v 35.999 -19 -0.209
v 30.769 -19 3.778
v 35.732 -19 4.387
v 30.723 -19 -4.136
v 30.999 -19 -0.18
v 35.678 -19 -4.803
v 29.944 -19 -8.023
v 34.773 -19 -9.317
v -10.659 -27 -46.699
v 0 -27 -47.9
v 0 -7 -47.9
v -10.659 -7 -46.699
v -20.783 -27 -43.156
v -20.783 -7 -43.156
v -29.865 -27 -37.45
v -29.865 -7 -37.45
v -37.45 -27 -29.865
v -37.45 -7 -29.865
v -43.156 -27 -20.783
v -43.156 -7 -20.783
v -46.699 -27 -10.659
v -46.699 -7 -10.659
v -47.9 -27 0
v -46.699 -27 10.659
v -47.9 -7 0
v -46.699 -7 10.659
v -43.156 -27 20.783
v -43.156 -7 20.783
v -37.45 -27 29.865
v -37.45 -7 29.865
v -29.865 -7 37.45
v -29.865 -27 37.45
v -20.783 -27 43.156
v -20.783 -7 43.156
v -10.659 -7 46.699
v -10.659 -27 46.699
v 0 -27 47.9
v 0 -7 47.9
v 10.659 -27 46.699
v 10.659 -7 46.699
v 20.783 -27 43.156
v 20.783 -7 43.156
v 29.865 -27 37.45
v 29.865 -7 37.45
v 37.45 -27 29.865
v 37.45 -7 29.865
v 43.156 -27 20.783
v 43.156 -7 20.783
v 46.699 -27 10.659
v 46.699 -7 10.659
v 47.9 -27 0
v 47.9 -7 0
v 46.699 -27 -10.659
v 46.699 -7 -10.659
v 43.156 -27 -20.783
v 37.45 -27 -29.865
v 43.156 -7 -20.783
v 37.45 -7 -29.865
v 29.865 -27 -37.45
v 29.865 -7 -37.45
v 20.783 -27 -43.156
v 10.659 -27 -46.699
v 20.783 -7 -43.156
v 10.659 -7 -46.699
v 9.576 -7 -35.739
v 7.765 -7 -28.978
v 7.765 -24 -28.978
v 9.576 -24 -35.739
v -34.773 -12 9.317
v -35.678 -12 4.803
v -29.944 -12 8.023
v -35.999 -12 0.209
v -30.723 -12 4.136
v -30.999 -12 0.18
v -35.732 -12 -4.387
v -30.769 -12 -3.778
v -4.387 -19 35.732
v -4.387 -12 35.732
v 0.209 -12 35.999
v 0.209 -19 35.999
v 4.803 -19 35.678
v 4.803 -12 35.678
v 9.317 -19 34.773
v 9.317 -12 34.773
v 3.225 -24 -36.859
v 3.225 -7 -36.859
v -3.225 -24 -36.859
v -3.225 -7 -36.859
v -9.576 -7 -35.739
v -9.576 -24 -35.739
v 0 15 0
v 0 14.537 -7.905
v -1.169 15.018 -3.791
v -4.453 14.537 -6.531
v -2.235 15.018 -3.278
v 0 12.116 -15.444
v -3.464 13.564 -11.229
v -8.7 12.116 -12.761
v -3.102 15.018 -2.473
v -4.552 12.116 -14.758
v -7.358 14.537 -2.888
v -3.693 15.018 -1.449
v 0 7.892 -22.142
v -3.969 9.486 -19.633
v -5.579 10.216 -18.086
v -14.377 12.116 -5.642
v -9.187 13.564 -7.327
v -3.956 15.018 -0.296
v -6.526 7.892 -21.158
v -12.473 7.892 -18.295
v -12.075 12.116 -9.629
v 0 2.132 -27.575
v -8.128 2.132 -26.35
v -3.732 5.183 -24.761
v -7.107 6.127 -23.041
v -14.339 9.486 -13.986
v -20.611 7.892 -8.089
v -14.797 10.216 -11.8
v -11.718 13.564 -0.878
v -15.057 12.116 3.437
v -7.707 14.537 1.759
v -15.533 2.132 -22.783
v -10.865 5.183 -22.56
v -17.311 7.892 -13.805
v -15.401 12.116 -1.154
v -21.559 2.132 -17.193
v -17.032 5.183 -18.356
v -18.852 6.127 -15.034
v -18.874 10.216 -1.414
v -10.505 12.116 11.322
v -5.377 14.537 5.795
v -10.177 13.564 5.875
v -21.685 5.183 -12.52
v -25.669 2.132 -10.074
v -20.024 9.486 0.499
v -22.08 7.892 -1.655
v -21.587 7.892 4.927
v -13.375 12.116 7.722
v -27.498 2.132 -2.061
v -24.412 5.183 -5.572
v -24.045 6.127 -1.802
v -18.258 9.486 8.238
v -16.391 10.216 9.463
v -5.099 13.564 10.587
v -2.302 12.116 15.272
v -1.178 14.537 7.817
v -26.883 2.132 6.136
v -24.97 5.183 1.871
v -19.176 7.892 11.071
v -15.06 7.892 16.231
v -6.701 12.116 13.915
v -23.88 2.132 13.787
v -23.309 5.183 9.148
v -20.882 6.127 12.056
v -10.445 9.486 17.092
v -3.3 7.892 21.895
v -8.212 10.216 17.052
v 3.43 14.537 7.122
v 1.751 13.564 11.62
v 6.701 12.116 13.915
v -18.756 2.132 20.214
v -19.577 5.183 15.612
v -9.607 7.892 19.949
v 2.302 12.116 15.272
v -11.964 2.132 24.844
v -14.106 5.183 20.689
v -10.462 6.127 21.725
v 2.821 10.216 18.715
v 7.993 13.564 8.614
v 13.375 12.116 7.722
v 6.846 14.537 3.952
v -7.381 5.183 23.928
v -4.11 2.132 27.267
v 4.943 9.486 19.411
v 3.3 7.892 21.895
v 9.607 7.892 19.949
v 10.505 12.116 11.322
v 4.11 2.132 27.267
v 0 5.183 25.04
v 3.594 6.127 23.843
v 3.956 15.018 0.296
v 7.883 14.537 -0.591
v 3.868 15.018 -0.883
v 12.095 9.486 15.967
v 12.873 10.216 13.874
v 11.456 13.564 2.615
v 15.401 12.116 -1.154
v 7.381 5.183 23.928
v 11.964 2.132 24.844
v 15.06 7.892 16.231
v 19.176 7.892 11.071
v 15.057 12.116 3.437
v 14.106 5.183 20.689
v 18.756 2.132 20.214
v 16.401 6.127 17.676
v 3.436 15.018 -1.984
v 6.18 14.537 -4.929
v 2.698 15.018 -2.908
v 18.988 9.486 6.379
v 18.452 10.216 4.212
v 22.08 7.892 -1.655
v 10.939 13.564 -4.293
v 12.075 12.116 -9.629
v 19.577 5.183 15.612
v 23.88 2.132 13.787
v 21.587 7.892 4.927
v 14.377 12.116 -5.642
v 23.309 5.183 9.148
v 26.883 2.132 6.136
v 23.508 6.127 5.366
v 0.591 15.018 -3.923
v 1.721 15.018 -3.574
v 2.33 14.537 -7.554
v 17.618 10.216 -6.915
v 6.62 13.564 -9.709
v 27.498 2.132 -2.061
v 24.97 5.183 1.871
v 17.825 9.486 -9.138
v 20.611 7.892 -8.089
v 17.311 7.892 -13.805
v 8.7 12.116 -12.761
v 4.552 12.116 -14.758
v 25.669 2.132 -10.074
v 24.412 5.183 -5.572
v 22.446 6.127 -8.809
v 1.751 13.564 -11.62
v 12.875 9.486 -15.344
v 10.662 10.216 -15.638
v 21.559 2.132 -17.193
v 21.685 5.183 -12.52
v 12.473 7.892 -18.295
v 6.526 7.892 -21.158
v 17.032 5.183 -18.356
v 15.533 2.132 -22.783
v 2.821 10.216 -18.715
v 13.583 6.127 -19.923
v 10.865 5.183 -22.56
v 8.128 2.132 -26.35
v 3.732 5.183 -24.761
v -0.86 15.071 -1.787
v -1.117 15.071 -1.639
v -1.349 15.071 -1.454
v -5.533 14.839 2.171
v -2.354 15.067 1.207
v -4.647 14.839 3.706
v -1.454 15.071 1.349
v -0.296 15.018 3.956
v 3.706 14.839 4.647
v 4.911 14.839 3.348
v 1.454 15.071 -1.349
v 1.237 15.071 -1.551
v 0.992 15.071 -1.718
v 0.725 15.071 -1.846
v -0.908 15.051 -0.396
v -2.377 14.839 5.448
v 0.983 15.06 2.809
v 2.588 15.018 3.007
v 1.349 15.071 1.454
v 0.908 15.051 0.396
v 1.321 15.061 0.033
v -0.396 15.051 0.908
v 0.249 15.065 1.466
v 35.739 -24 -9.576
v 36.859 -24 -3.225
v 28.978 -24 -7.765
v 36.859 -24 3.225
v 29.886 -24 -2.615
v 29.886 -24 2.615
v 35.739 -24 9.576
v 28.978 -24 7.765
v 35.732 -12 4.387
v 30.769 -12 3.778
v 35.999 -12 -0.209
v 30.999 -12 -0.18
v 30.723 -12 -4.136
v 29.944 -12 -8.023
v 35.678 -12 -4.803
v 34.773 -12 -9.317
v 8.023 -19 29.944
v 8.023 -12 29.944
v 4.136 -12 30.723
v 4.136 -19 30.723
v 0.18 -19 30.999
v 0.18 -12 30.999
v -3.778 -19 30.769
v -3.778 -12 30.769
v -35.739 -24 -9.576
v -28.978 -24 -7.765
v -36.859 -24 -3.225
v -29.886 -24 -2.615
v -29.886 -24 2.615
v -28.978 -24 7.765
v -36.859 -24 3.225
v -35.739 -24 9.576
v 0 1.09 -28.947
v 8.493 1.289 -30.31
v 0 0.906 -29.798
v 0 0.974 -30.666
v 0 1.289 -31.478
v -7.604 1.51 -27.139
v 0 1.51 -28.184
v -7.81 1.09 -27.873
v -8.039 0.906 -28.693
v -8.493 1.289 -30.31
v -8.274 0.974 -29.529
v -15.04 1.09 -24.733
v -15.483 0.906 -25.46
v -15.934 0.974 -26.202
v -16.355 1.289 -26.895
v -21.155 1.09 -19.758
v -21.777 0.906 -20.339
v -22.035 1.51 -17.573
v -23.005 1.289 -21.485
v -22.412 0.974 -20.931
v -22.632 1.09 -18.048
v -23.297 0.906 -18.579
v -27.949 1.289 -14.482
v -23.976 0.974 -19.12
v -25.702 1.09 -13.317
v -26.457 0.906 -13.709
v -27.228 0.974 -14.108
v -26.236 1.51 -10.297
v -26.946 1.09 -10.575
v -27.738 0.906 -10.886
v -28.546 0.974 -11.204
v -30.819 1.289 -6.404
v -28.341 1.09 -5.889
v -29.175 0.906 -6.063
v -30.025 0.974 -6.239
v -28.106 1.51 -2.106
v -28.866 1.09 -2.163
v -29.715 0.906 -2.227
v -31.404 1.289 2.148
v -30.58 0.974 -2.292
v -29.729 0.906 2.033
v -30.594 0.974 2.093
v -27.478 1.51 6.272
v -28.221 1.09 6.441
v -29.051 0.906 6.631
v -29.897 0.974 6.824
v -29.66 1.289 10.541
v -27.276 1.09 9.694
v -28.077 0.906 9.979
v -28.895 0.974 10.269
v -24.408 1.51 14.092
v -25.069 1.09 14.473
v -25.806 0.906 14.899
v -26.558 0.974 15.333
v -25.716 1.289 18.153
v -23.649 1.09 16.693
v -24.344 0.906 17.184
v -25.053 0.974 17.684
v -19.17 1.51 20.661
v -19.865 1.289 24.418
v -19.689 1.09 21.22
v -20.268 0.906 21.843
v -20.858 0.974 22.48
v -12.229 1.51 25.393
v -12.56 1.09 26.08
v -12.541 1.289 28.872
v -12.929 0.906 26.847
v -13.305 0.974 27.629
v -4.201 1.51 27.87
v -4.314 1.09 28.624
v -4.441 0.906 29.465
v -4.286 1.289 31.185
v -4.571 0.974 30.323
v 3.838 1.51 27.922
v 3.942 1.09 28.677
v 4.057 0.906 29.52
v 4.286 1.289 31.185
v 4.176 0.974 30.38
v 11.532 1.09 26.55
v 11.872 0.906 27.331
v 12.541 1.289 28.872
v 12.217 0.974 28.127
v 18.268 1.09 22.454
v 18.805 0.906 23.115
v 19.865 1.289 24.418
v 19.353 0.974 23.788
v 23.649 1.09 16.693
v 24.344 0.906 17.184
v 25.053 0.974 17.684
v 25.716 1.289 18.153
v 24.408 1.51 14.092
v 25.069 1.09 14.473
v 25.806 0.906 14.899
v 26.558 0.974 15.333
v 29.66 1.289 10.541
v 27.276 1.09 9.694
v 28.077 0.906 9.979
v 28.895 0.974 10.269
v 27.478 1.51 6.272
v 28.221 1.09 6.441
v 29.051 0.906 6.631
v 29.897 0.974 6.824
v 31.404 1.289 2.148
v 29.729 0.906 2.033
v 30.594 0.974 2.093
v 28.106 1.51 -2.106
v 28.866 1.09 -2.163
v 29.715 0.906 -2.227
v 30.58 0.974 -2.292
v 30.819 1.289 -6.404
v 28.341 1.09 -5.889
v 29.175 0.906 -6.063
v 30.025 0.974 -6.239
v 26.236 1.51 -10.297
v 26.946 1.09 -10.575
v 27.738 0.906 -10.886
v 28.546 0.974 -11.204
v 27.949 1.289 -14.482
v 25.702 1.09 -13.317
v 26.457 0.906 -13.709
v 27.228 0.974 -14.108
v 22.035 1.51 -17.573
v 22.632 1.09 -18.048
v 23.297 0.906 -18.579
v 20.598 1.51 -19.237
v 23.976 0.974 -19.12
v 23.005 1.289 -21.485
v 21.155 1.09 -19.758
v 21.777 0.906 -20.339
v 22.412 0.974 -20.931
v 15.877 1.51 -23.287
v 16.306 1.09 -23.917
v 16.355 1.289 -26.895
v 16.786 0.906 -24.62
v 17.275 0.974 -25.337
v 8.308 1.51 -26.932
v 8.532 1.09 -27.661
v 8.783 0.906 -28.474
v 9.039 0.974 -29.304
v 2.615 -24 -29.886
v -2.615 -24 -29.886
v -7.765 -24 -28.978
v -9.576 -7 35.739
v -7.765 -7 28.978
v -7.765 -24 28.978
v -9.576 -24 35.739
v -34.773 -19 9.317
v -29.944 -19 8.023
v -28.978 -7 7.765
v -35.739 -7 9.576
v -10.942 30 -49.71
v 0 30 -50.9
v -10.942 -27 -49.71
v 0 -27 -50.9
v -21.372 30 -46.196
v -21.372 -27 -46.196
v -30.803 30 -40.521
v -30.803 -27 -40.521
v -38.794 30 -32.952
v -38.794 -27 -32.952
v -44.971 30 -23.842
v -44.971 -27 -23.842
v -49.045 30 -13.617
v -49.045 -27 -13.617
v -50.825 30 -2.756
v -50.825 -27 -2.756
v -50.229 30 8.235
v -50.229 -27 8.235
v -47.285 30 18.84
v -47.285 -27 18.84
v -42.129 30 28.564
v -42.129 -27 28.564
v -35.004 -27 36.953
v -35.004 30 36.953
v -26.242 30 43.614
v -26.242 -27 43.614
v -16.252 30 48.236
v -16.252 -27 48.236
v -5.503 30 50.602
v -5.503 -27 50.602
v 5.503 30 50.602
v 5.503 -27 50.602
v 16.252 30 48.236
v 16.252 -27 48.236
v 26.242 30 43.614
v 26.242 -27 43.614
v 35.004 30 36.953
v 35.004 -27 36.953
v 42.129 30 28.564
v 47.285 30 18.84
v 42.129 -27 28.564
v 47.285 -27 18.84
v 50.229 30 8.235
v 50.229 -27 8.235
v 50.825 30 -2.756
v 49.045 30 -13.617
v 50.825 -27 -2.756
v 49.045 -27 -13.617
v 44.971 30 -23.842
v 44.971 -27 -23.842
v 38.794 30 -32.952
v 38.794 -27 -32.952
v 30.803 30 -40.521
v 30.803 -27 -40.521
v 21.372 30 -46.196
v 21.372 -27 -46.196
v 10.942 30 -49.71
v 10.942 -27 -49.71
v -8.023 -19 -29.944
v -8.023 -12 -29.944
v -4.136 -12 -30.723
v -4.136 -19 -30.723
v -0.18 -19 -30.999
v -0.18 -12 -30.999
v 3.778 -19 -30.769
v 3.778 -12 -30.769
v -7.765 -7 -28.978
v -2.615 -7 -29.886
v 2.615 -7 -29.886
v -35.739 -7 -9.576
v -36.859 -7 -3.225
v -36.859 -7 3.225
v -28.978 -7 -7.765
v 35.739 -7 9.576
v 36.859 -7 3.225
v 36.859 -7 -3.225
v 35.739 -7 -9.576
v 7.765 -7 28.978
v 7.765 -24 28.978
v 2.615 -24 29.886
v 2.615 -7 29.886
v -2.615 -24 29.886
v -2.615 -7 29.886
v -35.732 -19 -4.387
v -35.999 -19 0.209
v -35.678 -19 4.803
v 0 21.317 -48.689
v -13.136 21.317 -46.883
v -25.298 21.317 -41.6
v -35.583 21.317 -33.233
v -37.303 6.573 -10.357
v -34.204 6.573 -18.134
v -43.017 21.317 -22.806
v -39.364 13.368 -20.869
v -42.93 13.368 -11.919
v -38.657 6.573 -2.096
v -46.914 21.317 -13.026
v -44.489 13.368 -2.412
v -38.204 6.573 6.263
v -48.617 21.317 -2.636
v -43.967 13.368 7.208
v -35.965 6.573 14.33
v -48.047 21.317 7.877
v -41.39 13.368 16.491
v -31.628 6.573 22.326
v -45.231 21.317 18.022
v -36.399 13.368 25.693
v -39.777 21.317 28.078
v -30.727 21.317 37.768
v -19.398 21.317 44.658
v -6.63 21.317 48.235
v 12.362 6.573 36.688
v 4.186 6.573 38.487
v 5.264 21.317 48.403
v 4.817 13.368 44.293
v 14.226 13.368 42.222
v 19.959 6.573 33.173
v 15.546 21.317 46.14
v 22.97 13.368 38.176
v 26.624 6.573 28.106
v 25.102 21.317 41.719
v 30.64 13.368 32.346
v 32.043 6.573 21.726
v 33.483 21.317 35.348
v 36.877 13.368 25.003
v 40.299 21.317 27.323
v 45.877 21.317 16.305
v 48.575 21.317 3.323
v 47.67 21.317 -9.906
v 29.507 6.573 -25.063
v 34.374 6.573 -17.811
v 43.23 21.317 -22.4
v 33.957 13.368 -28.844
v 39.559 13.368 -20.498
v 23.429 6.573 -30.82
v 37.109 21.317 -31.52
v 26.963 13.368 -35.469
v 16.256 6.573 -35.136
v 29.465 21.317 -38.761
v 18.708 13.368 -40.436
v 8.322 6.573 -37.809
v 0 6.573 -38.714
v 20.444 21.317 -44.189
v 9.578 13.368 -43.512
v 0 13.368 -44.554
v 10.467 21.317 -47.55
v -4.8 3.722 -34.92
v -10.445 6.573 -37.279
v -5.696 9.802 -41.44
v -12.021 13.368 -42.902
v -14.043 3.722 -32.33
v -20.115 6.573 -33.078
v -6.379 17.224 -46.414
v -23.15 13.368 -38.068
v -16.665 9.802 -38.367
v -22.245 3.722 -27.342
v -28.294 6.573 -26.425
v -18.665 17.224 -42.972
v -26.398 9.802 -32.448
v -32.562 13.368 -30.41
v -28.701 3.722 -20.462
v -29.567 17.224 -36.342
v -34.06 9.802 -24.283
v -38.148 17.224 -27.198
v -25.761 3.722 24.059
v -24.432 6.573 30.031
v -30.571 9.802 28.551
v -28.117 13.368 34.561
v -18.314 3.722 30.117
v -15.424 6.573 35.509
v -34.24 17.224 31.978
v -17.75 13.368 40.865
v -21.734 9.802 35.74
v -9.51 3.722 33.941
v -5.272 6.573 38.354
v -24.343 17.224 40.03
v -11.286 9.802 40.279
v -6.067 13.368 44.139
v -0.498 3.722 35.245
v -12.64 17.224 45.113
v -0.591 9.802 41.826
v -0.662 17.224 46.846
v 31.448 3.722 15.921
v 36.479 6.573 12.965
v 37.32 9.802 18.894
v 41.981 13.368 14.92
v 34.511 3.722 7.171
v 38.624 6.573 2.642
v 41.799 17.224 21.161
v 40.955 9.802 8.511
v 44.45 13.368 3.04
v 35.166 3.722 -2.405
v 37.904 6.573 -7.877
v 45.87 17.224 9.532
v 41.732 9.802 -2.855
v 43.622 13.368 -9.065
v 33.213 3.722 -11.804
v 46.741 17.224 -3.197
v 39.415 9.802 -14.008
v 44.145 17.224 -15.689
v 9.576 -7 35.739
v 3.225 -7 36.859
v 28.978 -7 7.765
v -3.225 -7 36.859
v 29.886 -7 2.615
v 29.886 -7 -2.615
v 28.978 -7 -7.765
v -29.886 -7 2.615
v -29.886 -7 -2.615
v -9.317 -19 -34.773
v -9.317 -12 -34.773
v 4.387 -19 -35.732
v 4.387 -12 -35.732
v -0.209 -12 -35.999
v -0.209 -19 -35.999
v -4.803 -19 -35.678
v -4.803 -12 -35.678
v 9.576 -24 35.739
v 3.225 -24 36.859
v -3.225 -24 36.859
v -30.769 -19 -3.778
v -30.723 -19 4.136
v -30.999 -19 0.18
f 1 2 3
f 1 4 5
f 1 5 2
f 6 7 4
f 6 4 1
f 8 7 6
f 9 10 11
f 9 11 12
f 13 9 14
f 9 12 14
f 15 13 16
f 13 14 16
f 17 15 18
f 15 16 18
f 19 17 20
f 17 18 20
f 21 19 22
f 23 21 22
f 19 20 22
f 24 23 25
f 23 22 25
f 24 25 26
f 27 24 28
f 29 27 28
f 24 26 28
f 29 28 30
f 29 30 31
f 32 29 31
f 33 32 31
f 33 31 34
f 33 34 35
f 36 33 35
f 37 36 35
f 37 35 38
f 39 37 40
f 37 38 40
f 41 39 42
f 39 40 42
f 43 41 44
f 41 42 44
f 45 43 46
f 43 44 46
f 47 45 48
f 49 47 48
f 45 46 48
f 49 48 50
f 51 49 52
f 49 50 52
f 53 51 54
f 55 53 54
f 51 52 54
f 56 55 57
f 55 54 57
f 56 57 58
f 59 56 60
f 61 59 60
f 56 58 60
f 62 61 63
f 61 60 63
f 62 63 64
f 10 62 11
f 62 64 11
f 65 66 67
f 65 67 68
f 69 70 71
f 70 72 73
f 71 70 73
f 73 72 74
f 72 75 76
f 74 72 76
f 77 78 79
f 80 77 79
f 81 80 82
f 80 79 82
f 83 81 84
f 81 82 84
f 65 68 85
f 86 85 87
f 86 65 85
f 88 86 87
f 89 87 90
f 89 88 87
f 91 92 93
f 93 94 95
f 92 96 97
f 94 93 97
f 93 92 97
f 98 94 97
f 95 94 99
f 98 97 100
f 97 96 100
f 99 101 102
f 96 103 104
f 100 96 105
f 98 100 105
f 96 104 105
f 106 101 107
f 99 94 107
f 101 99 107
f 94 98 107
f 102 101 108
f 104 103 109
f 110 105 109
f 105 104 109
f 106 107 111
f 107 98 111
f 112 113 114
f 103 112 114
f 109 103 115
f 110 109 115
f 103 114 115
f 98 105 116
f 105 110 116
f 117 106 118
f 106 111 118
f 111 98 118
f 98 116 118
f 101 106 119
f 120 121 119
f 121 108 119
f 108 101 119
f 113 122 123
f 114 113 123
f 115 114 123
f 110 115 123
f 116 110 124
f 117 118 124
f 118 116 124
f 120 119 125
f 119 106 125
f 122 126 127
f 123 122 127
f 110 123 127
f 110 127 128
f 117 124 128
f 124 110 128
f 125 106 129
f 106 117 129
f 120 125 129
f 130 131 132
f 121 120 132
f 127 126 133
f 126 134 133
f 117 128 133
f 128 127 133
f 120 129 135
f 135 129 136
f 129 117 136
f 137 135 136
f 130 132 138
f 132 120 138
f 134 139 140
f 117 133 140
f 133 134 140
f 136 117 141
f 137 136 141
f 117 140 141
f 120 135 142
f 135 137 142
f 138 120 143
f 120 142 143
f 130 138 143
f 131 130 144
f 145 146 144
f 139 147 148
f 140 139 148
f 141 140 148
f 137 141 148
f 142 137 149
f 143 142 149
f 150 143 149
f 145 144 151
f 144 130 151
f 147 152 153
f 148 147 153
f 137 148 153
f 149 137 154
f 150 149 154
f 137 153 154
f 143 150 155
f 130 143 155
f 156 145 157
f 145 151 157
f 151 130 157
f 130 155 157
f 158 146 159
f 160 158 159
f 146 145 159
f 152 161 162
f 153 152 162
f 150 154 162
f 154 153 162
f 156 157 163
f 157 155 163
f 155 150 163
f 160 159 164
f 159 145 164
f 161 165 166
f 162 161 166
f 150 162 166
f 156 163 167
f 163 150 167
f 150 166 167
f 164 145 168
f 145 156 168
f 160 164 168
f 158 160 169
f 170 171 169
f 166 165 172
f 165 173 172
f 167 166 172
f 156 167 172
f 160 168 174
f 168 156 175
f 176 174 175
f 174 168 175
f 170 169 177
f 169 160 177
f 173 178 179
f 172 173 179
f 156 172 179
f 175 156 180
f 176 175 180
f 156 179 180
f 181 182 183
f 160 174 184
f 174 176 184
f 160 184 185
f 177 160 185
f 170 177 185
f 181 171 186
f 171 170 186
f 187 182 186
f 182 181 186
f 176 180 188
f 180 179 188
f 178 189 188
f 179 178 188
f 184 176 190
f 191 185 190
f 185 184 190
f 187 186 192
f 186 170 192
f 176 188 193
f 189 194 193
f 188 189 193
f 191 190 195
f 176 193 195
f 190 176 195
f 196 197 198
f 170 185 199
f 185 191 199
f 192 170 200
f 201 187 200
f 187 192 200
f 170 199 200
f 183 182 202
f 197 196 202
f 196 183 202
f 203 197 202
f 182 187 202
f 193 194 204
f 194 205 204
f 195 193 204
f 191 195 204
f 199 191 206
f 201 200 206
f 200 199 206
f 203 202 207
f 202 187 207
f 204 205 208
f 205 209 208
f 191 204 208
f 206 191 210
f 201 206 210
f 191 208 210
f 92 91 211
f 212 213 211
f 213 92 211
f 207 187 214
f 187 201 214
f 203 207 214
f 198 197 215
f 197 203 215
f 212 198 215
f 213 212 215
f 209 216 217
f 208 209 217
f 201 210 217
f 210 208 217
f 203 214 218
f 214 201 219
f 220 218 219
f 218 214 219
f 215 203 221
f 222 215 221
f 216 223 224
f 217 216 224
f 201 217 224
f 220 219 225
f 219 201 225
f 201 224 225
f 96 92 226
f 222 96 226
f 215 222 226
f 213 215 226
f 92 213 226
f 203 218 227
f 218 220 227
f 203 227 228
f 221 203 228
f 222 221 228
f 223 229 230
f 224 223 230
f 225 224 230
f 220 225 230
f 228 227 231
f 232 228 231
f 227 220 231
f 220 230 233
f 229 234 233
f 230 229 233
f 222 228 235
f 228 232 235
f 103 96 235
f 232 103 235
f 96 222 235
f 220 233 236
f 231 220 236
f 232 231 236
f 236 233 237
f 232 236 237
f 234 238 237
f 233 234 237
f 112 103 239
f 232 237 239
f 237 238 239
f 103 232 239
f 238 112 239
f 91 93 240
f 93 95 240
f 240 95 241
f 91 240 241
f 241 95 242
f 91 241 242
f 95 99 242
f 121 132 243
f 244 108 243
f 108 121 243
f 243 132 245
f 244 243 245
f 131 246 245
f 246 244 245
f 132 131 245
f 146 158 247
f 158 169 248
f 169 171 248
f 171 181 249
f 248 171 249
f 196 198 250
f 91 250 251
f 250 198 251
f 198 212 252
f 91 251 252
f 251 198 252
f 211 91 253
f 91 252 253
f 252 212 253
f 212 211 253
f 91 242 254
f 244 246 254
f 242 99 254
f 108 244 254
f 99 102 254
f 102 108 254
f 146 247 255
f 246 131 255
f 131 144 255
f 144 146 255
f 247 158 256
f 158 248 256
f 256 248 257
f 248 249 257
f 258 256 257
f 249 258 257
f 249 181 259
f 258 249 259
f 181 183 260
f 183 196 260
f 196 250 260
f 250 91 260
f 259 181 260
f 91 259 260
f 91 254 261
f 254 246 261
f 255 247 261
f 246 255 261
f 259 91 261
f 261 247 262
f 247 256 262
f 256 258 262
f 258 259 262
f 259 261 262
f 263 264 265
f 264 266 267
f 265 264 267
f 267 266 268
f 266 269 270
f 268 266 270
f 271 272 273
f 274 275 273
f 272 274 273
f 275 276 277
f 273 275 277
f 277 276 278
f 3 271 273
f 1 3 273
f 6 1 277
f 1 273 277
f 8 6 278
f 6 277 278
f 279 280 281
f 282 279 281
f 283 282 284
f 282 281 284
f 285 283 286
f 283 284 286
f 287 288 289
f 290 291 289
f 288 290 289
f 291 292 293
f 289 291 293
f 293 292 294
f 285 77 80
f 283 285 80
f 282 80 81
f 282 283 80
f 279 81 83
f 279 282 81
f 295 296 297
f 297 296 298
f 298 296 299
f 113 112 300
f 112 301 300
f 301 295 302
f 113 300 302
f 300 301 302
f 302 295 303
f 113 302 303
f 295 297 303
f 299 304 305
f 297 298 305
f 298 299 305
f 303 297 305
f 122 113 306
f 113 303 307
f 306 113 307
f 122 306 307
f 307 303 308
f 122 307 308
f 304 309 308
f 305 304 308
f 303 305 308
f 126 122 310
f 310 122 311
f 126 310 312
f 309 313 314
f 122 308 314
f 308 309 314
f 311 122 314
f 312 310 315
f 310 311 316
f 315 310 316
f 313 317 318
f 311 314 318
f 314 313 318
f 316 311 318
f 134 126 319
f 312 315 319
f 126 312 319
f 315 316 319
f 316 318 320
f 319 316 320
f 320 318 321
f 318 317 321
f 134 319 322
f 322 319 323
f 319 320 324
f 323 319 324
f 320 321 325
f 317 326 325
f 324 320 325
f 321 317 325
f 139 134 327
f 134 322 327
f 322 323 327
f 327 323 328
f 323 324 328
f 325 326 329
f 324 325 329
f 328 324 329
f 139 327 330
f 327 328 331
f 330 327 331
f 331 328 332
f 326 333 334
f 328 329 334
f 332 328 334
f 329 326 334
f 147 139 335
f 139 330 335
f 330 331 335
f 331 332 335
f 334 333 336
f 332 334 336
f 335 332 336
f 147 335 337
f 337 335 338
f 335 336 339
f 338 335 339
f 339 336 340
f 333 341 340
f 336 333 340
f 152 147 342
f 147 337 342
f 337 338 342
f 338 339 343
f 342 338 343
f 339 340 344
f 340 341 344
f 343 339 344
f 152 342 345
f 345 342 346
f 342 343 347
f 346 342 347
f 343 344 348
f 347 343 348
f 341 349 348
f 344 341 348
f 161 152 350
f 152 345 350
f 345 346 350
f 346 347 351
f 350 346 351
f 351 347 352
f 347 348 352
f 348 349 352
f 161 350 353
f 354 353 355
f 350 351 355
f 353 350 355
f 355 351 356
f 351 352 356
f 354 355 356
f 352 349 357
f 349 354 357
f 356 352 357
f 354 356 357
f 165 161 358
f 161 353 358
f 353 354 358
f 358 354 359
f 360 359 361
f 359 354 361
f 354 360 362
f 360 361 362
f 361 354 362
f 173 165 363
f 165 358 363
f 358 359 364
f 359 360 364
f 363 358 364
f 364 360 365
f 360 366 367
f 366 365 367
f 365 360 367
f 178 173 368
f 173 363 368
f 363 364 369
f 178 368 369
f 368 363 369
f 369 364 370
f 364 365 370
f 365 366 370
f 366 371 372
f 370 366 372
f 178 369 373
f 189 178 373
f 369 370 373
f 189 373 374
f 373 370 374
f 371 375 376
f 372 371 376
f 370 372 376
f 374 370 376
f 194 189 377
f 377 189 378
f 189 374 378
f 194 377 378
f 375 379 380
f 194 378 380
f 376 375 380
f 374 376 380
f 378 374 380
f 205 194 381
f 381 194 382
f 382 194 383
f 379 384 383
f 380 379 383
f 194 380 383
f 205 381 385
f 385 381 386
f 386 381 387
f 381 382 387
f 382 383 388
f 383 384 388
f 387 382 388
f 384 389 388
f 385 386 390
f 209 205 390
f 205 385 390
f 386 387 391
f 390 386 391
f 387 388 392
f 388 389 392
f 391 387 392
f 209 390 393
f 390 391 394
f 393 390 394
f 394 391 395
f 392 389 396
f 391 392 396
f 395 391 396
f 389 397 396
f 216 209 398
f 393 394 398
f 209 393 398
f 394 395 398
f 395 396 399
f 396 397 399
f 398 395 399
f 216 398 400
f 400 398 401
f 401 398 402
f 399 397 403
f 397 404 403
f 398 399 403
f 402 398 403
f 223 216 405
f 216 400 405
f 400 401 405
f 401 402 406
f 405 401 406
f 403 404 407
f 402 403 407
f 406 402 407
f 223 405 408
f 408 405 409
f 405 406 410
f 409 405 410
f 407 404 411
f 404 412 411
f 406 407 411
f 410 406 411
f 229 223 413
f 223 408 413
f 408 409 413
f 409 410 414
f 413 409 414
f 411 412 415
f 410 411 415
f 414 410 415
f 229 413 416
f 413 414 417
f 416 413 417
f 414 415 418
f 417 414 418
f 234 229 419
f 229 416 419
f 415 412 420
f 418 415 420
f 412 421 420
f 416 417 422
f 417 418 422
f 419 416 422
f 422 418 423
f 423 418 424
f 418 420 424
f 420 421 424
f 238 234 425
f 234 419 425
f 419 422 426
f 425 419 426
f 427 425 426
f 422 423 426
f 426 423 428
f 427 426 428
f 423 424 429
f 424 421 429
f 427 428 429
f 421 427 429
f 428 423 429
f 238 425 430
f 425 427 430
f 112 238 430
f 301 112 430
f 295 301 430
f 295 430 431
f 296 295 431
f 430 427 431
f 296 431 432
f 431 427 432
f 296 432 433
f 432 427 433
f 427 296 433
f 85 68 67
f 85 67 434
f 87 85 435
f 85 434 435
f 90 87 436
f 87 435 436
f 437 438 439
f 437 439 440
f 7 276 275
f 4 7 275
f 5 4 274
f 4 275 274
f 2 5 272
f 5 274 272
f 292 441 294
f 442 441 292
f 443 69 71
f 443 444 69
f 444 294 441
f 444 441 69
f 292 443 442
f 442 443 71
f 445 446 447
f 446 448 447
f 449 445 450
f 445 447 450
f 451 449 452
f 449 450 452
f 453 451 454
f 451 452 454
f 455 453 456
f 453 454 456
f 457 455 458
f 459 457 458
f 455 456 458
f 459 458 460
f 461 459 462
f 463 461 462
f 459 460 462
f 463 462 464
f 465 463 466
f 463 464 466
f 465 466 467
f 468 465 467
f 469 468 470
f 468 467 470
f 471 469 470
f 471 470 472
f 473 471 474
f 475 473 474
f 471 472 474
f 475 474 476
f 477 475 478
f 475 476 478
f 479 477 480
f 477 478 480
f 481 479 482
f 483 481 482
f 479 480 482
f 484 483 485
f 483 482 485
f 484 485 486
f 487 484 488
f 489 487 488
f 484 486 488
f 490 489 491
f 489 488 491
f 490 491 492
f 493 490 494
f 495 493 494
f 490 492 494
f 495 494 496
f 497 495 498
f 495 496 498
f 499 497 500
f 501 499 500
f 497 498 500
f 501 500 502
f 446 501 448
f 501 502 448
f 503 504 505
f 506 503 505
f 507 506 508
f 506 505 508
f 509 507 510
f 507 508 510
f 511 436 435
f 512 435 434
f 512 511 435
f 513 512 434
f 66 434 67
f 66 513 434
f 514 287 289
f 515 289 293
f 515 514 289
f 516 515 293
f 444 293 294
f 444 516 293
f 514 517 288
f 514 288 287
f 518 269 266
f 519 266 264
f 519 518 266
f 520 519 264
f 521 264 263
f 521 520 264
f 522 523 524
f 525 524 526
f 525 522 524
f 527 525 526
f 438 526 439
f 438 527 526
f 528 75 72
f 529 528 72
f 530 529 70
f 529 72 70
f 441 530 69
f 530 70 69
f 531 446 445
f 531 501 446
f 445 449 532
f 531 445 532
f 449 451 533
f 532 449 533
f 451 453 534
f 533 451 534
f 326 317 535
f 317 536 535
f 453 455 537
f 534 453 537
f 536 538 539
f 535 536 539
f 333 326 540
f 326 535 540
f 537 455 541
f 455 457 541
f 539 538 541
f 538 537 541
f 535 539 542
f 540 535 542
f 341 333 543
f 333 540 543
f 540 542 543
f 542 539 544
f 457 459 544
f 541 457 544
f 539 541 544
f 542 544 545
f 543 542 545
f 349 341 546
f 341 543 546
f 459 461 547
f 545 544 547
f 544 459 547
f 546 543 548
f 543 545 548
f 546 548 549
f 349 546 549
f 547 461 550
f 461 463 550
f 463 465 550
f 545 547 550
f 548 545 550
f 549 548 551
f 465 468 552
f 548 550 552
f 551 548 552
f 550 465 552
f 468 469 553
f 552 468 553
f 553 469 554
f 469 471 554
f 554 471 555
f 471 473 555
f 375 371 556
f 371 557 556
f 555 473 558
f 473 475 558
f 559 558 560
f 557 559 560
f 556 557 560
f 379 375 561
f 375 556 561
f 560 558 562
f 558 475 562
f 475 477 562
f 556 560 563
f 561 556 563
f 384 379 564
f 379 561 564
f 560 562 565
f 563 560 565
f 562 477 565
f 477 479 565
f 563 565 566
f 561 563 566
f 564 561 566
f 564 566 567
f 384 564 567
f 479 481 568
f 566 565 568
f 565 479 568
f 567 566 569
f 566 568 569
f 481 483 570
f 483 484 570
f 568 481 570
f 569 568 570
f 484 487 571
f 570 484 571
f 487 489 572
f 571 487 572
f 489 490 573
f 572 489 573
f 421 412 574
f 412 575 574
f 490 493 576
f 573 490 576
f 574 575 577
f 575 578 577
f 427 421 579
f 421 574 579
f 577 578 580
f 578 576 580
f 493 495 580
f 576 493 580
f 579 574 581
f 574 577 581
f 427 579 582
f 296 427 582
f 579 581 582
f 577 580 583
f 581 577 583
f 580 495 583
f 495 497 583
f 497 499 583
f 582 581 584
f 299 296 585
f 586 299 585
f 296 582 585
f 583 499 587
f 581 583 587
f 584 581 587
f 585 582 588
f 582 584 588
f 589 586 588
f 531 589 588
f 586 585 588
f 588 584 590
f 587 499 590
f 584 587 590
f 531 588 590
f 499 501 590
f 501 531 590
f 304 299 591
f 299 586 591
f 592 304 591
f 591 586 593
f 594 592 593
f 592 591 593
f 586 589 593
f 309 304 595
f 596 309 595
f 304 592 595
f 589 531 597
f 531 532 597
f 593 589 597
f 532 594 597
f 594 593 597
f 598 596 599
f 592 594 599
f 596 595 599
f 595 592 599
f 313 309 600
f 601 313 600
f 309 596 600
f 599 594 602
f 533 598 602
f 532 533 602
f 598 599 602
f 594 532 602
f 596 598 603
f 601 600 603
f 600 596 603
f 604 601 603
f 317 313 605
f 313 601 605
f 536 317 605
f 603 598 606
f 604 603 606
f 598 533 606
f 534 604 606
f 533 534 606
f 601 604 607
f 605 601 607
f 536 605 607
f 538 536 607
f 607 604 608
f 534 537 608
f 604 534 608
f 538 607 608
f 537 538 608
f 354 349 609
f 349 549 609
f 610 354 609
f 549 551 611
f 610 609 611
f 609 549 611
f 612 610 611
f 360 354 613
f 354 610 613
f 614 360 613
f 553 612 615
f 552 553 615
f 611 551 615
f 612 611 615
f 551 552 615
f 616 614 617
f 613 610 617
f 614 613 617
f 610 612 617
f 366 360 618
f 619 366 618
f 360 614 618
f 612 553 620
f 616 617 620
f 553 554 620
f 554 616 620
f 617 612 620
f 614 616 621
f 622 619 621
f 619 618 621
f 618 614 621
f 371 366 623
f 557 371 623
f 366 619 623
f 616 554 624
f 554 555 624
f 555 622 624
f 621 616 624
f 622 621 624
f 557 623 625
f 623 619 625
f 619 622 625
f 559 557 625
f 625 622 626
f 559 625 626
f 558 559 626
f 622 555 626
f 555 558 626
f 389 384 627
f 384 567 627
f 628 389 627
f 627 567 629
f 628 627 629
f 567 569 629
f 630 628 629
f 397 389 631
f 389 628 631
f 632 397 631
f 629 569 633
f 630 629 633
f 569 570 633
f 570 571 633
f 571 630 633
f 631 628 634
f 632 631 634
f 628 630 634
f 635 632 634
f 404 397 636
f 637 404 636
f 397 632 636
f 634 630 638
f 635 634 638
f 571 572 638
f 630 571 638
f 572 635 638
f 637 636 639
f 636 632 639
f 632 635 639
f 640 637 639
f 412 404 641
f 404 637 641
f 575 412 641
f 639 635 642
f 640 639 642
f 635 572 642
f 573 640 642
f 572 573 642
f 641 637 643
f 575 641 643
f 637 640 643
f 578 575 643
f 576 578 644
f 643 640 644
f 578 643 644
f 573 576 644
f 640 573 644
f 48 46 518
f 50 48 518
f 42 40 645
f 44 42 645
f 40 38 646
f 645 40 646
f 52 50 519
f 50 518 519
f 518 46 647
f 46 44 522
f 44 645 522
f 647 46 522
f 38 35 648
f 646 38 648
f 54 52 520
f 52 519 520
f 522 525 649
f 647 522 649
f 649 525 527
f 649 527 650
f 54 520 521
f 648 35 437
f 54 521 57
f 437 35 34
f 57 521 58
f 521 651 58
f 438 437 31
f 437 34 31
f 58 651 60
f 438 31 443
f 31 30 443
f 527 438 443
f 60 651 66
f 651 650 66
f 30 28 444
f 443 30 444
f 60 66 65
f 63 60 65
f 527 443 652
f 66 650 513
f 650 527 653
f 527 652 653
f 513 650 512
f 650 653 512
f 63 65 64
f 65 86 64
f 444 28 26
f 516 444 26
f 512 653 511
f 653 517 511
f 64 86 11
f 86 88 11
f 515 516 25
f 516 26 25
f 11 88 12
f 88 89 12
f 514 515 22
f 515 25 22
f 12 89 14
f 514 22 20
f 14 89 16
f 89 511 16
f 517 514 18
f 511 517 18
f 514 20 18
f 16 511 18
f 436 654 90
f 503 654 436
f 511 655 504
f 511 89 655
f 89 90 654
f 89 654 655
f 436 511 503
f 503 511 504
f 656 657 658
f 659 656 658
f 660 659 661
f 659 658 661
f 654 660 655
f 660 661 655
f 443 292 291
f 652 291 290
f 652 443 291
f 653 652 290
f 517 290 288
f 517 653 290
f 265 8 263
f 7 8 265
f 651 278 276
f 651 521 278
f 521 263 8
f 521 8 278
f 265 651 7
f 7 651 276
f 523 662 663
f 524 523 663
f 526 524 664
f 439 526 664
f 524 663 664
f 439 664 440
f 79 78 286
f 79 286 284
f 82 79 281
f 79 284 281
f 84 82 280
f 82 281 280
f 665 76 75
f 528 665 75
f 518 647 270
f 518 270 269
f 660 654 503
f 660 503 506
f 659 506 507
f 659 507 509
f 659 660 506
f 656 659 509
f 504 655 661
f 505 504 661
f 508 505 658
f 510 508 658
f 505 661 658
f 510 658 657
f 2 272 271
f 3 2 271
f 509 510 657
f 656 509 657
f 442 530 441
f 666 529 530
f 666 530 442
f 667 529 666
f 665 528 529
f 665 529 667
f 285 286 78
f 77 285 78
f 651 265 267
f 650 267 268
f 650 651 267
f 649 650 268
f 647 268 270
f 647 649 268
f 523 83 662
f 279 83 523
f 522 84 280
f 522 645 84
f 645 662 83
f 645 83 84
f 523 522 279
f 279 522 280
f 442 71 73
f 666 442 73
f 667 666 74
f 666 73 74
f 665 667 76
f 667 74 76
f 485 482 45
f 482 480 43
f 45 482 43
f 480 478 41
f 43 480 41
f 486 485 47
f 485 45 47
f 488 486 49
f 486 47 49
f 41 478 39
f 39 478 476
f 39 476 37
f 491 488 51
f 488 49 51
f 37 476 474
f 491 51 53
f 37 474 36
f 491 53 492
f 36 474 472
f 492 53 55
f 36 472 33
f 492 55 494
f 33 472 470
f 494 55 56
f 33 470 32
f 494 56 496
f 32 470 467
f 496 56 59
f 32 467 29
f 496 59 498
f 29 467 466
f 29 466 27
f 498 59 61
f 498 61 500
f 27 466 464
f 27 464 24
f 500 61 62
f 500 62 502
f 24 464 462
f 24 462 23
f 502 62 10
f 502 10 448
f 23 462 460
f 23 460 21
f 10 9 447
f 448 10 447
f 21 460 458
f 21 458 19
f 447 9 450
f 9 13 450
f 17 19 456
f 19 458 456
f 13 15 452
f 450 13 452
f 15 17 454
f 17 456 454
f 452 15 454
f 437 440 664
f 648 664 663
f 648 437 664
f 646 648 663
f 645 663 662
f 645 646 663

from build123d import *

# Parameters (mm, degrees)
BOSS_EXTRUDE1_DEPTH = 17
CUT_EXTRUDE1_DEPTH  = 7


with BuildPart() as part:
    # Sketch1 → Revolve1 (revolve)
    with BuildSketch(Plane.XY, mode=Mode.PRIVATE) as revolve1_sk:
        with BuildLine():
            ThreePointArc((31.477739174, 1.289033786), (44.553939615, 13.368129979), (50.9, 30))
            Line((50.9, 30), (50.9, 0))
            Line((50.9, 0), (50.9, -7))
            Line((50.9, -7), (50.9, -27))
            Line((50.9, -27), (47.9, -27))
            Line((47.9, -27), (47.9, -7))
            Line((47.9, -7), (0, -7))
            Line((0, -7), (0, 0))
            Line((0, 0), (0, 15))
            ThreePointArc((0, 15), (15.444355802, 12.116315948), (27.574800041, 2.13152339))
            ThreePointArc((27.574800041, 2.13152339), (29.365754755, 0.96667333), (31.477739174, 1.289033786))
        make_face()
    revolve(revolve1_sk.sketch.rotate(Axis((0, 0, 0), (0, 1, 0)), 90), axis=Axis((0, 0, 0), (0, 1, 0)))

    # Sketch2 → Boss-Extrude1 (add)
    with BuildSketch(Plane.XZ.offset(7)):
        with BuildLine():
            Line((7.764571353, -28.977774789), (9.576304669, -35.739255573))
            ThreePointArc((9.576304669, -35.739255573), (0, -37), (-9.576304669, -35.739255573))
            Line((-9.576304669, -35.739255573), (-7.764571353, -28.977774789))
            ThreePointArc((-7.764571353, -28.977774789), (0, -30), (7.764571353, -28.977774789))
        make_face()
        with BuildLine():
            Line((28.977774789, 7.764571353), (35.739255573, 9.576304669))
            ThreePointArc((35.739255573, 9.576304669), (37, 0), (35.739255573, -9.576304669))
            Line((35.739255573, -9.576304669), (28.977774789, -7.764571353))
            ThreePointArc((28.977774789, -7.764571353), (30, 0), (28.977774789, 7.764571353))
        make_face()
        with BuildLine():
            Line((-28.977774789, -7.764571353), (-35.739255573, -9.576304669))
            ThreePointArc((-35.739255573, -9.576304669), (-37, 0), (-35.739255573, 9.576304669))
            Line((-35.739255573, 9.576304669), (-28.977774789, 7.764571353))
            ThreePointArc((-28.977774789, 7.764571353), (-30, 0), (-28.977774789, -7.764571353))
        make_face()
        with BuildLine():
            Line((-7.764571353, 28.977774789), (-9.576304669, 35.739255573))
            ThreePointArc((-9.576304669, 35.739255573), (0, 37), (9.576304669, 35.739255573))
            Line((9.576304669, 35.739255573), (7.764571353, 28.977774789))
            ThreePointArc((7.764571353, 28.977774789), (0, 30), (-7.764571353, 28.977774789))
        make_face()
    extrude(amount=BOSS_EXTRUDE1_DEPTH)

    # Sketch3 → Cut-Extrude1 (cut)
    with BuildSketch(Plane(origin=(0, -12, 0), x_dir=(-1, 0, 0), z_dir=(0, -1, 0))):
        with BuildLine():
            Line((3.777949646, -30.768930701), (4.387296363, -35.731661459))
            ThreePointArc((4.387296363, -35.731661459), (-2.511233055, -35.912305809), (-9.317485624, -34.773329746))
            Line((-9.317485624, -34.773329746), (-8.023390398, -29.943700615))
            ThreePointArc((-8.023390398, -29.943700615), (-2.162450686, -30.924485558), (3.777949646, -30.768930701))
        make_face()
        with BuildLine():
            Line((30.768930701, 3.777949646), (35.731661459, 4.387296363))
            ThreePointArc((35.731661459, 4.387296363), (35.912305809, -2.511233055), (34.773329746, -9.317485624))
            Line((34.773329746, -9.317485624), (29.943700615, -8.023390398))
            ThreePointArc((29.943700615, -8.023390398), (30.924485558, -2.162450686), (30.768930701, 3.777949646))
        make_face()
        with BuildLine():
            Line((-30.768930701, -3.777949646), (-35.731661459, -4.387296363))
            ThreePointArc((-35.731661459, -4.387296363), (-35.912305809, 2.511233055), (-34.773329746, 9.317485624))
            Line((-34.773329746, 9.317485624), (-29.943700615, 8.023390398))
            ThreePointArc((-29.943700615, 8.023390398), (-30.924485558, 2.162450686), (-30.768930701, -3.777949646))
        make_face()
        with BuildLine():
            Line((-3.777949646, 30.768930701), (-4.387296363, 35.731661459))
            ThreePointArc((-4.387296363, 35.731661459), (2.511233055, 35.912305809), (9.317485624, 34.773329746))
            Line((9.317485624, 34.773329746), (8.023390398, 29.943700615))
            ThreePointArc((8.023390398, 29.943700615), (2.162450686, 30.924485558), (-3.777949646, 30.768930701))
        make_face()
    extrude(amount=CUT_EXTRUDE1_DEPTH, mode=Mode.SUBTRACT)


solid = part.part
